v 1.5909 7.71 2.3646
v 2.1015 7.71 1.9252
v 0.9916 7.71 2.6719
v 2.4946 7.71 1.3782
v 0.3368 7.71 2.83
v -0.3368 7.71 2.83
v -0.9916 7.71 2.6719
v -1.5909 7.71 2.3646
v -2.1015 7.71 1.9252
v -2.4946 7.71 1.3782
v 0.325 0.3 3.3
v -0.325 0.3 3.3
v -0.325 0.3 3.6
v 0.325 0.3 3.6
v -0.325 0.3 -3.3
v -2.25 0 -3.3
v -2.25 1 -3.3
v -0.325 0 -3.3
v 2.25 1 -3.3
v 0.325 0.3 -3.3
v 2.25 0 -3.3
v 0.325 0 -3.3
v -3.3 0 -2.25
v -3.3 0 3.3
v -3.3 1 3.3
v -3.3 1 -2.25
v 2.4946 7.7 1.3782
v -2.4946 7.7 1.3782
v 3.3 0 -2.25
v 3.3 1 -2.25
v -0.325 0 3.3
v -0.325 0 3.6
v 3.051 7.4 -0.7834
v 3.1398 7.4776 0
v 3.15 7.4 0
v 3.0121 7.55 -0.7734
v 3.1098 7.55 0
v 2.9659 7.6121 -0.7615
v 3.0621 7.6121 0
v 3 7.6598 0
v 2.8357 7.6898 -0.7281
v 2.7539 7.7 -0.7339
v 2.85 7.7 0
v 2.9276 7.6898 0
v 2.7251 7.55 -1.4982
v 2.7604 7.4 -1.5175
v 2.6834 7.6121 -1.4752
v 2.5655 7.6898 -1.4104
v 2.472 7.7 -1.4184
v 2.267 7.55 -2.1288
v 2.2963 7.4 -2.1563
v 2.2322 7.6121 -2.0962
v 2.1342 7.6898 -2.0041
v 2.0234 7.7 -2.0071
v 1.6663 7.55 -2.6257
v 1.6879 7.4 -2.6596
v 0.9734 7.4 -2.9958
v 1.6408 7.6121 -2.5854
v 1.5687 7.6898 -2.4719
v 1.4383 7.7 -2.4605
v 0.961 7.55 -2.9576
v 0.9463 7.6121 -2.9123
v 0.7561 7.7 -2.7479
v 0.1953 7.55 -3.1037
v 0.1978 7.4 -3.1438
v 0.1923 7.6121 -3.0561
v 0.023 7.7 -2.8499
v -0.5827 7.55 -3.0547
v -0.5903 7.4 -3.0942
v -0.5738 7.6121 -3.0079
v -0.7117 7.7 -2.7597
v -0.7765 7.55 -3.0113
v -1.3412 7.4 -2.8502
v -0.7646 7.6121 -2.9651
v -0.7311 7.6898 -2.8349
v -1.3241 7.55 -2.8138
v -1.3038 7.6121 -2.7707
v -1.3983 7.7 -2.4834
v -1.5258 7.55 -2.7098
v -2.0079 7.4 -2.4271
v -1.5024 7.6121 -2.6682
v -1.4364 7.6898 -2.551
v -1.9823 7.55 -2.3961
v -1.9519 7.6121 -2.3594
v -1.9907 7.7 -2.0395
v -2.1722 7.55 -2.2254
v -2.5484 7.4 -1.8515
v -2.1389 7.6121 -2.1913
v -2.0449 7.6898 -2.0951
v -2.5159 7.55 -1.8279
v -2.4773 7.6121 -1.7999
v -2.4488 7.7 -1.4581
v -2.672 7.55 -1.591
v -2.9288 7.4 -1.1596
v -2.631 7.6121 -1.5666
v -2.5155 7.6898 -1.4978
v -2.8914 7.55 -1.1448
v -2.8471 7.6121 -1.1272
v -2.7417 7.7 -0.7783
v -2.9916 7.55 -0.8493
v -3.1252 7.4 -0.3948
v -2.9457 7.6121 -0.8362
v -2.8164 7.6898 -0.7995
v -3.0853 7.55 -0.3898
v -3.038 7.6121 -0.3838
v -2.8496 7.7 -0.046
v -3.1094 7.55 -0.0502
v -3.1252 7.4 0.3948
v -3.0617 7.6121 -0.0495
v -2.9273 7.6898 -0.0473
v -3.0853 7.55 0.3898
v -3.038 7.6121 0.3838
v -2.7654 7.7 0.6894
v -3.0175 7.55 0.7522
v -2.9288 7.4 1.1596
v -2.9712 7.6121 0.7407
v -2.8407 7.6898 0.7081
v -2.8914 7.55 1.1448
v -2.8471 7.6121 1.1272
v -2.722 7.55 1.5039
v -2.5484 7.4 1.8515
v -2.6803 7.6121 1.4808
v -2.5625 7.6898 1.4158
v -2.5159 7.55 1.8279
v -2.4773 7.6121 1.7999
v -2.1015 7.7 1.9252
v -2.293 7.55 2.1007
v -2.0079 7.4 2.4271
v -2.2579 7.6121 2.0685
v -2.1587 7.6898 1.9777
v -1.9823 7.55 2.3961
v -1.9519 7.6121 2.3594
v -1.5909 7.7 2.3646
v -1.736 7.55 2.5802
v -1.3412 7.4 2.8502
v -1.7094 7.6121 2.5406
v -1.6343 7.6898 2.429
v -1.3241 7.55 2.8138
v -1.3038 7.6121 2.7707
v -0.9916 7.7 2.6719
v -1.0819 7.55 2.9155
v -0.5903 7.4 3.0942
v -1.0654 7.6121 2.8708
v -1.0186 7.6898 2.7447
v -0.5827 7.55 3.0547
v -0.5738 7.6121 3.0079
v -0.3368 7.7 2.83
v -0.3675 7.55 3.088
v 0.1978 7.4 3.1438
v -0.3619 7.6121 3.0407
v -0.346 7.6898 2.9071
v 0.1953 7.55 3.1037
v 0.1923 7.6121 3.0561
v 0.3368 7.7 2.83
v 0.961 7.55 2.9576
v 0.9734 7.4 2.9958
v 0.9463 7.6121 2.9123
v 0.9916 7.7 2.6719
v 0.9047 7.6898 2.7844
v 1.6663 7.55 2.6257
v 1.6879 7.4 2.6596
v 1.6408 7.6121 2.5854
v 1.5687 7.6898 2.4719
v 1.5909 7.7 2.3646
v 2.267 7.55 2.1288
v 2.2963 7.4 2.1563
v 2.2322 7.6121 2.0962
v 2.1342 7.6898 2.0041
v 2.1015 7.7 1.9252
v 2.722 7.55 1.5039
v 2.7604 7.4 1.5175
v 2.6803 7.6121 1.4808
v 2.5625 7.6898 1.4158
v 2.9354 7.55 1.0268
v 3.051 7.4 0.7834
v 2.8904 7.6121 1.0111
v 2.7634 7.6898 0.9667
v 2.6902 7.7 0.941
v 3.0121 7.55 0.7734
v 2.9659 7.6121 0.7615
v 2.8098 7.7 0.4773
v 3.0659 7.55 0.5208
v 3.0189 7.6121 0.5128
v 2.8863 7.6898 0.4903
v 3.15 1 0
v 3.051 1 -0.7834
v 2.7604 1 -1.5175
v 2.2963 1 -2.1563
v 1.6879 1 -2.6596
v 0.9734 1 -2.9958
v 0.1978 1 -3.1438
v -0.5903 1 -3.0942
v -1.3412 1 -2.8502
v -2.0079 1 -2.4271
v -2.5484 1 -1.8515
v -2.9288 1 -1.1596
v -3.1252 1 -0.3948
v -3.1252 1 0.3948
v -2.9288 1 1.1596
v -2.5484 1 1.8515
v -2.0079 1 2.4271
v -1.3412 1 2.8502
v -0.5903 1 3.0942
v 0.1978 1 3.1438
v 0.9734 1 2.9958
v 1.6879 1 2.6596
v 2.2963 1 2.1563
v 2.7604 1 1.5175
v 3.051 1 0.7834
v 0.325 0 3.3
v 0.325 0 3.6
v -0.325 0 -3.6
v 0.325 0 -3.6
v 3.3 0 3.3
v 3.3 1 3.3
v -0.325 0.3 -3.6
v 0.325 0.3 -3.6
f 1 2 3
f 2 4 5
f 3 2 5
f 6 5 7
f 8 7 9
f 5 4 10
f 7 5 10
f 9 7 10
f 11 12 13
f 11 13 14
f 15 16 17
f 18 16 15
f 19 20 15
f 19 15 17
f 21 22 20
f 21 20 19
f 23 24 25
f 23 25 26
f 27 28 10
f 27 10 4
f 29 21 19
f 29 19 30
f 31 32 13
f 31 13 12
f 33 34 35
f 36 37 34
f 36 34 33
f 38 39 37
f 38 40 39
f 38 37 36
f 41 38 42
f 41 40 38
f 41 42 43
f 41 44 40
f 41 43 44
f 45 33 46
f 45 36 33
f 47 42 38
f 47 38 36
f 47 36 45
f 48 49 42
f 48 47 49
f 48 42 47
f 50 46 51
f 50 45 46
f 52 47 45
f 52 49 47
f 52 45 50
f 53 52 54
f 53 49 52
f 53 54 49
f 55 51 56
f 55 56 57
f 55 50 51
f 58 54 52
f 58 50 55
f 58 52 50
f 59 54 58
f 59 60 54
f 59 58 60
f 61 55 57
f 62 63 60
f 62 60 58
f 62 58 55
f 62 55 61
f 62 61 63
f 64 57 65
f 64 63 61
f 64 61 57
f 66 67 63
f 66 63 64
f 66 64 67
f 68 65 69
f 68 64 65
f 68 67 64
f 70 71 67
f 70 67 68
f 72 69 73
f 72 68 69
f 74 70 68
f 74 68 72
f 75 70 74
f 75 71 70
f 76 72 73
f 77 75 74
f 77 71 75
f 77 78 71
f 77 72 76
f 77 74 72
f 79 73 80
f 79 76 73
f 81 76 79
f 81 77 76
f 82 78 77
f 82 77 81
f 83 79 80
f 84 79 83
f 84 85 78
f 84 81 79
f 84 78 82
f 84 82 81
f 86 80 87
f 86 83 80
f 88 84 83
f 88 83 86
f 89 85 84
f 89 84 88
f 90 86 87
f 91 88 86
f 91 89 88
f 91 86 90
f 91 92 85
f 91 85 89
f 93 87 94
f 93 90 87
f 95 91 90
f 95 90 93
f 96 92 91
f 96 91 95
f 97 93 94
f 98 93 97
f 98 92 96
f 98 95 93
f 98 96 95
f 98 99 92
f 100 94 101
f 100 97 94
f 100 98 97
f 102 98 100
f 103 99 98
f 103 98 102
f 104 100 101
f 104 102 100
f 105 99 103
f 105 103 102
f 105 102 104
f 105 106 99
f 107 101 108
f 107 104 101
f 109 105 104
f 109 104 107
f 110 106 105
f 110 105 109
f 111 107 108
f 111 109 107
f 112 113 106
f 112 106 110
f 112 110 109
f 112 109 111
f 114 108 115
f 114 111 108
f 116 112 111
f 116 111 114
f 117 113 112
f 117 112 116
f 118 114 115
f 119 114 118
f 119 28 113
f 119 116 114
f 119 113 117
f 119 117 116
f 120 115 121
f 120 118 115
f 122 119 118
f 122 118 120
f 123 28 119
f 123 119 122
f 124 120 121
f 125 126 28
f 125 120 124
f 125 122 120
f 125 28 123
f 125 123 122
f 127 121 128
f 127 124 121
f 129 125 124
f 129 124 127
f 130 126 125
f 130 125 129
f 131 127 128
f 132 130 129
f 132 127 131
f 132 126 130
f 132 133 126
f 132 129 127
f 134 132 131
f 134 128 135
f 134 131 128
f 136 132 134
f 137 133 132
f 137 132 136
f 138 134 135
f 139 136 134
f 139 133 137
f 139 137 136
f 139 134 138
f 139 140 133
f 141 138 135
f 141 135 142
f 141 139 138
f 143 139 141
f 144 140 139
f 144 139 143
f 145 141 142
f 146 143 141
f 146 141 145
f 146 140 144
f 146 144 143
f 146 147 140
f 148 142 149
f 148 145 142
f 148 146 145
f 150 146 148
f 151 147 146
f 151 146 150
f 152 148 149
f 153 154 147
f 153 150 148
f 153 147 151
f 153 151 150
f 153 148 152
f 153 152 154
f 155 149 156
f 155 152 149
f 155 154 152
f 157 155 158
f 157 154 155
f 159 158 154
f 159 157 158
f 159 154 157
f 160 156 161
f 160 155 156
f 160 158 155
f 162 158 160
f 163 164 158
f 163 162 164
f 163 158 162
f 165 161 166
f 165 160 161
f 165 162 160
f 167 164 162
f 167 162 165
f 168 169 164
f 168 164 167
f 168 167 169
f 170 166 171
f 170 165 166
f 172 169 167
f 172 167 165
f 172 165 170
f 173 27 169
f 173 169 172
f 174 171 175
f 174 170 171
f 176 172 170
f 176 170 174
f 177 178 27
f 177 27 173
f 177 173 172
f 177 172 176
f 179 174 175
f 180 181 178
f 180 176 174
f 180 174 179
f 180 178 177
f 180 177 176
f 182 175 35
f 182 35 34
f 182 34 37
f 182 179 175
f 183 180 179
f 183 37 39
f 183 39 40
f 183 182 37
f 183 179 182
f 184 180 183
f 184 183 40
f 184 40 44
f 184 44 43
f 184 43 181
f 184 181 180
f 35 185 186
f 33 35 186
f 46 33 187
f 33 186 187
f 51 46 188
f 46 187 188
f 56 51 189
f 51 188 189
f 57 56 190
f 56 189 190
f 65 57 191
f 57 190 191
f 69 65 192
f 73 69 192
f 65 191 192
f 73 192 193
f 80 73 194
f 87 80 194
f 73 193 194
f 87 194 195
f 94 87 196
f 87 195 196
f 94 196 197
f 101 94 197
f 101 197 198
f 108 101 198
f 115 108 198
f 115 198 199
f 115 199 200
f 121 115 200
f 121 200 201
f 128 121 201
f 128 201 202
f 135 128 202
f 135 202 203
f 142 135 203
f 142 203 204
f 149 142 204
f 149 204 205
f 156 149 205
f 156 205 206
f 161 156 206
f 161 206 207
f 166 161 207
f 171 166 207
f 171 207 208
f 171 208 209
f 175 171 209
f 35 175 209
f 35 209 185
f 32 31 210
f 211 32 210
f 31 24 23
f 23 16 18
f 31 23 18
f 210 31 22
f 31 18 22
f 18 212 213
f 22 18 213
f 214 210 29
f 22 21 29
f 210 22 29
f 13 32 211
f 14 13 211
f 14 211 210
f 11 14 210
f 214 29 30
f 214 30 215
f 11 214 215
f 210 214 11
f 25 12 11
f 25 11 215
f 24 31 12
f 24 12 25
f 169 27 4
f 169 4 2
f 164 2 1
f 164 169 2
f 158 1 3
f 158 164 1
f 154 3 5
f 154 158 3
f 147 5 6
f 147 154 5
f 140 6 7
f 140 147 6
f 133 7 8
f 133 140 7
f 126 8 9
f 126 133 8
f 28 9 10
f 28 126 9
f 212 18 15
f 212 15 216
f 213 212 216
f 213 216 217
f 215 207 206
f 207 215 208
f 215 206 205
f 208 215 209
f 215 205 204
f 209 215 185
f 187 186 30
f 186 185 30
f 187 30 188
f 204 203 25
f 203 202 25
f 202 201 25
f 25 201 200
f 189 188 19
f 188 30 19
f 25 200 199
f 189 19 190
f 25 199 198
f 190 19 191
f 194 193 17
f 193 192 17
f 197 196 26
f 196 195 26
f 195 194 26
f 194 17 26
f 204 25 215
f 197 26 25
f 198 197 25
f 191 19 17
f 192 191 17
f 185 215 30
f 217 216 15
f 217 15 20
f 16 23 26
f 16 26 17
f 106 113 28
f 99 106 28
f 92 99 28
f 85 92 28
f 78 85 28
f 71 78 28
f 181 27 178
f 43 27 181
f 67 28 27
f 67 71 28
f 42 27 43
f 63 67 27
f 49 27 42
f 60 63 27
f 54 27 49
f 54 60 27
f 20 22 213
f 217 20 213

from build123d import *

# Parameters (mm, degrees)
BOSS_EXTRUDE1_DEPTH = 1
SKETCH3_R           = 3.15
BOSS_EXTRUDE2_DEPTH = 7.7
FILLET1_R           = 0.3
SKETCH4_W           = 0.65
SKETCH4_H           = 2.8
BOSS_EXTRUDE3_DEPTH = 0.3
BOSS_EXTRUDE4_DEPTH = 0.01


with BuildPart() as part:
    # Sketch2 → Boss-Extrude1 (new body)
    with BuildSketch(Plane(origin=(0, 0, 0), x_dir=(1, 0, 0), z_dir=(0, 1, 0))):
        Polygon((3.3, -3.3), (-3.3, -3.3), (-3.3, 2.25), (-2.25, 3.3), (2.25, 3.3), (3.3, 2.25), align=None)
    extrude(amount=BOSS_EXTRUDE1_DEPTH)

    # Sketch3 → Boss-Extrude2 (add)
    with BuildSketch(Plane(origin=(0, 0, 0), x_dir=(1, 0, 0), z_dir=(0, 1, 0))):
        Circle(SKETCH3_R)
    extrude(amount=BOSS_EXTRUDE2_DEPTH)

    # Fillet1
    fillet1_edges = [part.edges().sort_by_distance(p)[0] for p in [
        (-3.15, 7.7, 0),
    ]]
    fillet(fillet1_edges, radius=FILLET1_R)

    # Sketch4 → Boss-Extrude3 (add)
    with BuildSketch(Plane(origin=(0, 0, 0), x_dir=(1, 0, 0), z_dir=(0, 1, 0))):
        with Locations((0, 2.2)):
            Rectangle(SKETCH4_W, SKETCH4_H)
        with Locations((0, -2.2)):
            Rectangle(SKETCH4_W, SKETCH4_H)
    extrude(amount=BOSS_EXTRUDE3_DEPTH)

    # Sketch5 → Boss-Extrude4 (add)
    with BuildSketch(Plane(origin=(0, 7.7, 0), x_dir=(1, 0, 0), z_dir=(0, 1, 0))):
        with BuildLine():
            Line((-2.494581862, -1.378245745), (2.494581862, -1.378245745))
            ThreePointArc((2.494581862, -1.378245745), (0, -2.85), (-2.494581862, -1.378245745))
        make_face()
    extrude(amount=BOSS_EXTRUDE4_DEPTH)


solid = part.part
